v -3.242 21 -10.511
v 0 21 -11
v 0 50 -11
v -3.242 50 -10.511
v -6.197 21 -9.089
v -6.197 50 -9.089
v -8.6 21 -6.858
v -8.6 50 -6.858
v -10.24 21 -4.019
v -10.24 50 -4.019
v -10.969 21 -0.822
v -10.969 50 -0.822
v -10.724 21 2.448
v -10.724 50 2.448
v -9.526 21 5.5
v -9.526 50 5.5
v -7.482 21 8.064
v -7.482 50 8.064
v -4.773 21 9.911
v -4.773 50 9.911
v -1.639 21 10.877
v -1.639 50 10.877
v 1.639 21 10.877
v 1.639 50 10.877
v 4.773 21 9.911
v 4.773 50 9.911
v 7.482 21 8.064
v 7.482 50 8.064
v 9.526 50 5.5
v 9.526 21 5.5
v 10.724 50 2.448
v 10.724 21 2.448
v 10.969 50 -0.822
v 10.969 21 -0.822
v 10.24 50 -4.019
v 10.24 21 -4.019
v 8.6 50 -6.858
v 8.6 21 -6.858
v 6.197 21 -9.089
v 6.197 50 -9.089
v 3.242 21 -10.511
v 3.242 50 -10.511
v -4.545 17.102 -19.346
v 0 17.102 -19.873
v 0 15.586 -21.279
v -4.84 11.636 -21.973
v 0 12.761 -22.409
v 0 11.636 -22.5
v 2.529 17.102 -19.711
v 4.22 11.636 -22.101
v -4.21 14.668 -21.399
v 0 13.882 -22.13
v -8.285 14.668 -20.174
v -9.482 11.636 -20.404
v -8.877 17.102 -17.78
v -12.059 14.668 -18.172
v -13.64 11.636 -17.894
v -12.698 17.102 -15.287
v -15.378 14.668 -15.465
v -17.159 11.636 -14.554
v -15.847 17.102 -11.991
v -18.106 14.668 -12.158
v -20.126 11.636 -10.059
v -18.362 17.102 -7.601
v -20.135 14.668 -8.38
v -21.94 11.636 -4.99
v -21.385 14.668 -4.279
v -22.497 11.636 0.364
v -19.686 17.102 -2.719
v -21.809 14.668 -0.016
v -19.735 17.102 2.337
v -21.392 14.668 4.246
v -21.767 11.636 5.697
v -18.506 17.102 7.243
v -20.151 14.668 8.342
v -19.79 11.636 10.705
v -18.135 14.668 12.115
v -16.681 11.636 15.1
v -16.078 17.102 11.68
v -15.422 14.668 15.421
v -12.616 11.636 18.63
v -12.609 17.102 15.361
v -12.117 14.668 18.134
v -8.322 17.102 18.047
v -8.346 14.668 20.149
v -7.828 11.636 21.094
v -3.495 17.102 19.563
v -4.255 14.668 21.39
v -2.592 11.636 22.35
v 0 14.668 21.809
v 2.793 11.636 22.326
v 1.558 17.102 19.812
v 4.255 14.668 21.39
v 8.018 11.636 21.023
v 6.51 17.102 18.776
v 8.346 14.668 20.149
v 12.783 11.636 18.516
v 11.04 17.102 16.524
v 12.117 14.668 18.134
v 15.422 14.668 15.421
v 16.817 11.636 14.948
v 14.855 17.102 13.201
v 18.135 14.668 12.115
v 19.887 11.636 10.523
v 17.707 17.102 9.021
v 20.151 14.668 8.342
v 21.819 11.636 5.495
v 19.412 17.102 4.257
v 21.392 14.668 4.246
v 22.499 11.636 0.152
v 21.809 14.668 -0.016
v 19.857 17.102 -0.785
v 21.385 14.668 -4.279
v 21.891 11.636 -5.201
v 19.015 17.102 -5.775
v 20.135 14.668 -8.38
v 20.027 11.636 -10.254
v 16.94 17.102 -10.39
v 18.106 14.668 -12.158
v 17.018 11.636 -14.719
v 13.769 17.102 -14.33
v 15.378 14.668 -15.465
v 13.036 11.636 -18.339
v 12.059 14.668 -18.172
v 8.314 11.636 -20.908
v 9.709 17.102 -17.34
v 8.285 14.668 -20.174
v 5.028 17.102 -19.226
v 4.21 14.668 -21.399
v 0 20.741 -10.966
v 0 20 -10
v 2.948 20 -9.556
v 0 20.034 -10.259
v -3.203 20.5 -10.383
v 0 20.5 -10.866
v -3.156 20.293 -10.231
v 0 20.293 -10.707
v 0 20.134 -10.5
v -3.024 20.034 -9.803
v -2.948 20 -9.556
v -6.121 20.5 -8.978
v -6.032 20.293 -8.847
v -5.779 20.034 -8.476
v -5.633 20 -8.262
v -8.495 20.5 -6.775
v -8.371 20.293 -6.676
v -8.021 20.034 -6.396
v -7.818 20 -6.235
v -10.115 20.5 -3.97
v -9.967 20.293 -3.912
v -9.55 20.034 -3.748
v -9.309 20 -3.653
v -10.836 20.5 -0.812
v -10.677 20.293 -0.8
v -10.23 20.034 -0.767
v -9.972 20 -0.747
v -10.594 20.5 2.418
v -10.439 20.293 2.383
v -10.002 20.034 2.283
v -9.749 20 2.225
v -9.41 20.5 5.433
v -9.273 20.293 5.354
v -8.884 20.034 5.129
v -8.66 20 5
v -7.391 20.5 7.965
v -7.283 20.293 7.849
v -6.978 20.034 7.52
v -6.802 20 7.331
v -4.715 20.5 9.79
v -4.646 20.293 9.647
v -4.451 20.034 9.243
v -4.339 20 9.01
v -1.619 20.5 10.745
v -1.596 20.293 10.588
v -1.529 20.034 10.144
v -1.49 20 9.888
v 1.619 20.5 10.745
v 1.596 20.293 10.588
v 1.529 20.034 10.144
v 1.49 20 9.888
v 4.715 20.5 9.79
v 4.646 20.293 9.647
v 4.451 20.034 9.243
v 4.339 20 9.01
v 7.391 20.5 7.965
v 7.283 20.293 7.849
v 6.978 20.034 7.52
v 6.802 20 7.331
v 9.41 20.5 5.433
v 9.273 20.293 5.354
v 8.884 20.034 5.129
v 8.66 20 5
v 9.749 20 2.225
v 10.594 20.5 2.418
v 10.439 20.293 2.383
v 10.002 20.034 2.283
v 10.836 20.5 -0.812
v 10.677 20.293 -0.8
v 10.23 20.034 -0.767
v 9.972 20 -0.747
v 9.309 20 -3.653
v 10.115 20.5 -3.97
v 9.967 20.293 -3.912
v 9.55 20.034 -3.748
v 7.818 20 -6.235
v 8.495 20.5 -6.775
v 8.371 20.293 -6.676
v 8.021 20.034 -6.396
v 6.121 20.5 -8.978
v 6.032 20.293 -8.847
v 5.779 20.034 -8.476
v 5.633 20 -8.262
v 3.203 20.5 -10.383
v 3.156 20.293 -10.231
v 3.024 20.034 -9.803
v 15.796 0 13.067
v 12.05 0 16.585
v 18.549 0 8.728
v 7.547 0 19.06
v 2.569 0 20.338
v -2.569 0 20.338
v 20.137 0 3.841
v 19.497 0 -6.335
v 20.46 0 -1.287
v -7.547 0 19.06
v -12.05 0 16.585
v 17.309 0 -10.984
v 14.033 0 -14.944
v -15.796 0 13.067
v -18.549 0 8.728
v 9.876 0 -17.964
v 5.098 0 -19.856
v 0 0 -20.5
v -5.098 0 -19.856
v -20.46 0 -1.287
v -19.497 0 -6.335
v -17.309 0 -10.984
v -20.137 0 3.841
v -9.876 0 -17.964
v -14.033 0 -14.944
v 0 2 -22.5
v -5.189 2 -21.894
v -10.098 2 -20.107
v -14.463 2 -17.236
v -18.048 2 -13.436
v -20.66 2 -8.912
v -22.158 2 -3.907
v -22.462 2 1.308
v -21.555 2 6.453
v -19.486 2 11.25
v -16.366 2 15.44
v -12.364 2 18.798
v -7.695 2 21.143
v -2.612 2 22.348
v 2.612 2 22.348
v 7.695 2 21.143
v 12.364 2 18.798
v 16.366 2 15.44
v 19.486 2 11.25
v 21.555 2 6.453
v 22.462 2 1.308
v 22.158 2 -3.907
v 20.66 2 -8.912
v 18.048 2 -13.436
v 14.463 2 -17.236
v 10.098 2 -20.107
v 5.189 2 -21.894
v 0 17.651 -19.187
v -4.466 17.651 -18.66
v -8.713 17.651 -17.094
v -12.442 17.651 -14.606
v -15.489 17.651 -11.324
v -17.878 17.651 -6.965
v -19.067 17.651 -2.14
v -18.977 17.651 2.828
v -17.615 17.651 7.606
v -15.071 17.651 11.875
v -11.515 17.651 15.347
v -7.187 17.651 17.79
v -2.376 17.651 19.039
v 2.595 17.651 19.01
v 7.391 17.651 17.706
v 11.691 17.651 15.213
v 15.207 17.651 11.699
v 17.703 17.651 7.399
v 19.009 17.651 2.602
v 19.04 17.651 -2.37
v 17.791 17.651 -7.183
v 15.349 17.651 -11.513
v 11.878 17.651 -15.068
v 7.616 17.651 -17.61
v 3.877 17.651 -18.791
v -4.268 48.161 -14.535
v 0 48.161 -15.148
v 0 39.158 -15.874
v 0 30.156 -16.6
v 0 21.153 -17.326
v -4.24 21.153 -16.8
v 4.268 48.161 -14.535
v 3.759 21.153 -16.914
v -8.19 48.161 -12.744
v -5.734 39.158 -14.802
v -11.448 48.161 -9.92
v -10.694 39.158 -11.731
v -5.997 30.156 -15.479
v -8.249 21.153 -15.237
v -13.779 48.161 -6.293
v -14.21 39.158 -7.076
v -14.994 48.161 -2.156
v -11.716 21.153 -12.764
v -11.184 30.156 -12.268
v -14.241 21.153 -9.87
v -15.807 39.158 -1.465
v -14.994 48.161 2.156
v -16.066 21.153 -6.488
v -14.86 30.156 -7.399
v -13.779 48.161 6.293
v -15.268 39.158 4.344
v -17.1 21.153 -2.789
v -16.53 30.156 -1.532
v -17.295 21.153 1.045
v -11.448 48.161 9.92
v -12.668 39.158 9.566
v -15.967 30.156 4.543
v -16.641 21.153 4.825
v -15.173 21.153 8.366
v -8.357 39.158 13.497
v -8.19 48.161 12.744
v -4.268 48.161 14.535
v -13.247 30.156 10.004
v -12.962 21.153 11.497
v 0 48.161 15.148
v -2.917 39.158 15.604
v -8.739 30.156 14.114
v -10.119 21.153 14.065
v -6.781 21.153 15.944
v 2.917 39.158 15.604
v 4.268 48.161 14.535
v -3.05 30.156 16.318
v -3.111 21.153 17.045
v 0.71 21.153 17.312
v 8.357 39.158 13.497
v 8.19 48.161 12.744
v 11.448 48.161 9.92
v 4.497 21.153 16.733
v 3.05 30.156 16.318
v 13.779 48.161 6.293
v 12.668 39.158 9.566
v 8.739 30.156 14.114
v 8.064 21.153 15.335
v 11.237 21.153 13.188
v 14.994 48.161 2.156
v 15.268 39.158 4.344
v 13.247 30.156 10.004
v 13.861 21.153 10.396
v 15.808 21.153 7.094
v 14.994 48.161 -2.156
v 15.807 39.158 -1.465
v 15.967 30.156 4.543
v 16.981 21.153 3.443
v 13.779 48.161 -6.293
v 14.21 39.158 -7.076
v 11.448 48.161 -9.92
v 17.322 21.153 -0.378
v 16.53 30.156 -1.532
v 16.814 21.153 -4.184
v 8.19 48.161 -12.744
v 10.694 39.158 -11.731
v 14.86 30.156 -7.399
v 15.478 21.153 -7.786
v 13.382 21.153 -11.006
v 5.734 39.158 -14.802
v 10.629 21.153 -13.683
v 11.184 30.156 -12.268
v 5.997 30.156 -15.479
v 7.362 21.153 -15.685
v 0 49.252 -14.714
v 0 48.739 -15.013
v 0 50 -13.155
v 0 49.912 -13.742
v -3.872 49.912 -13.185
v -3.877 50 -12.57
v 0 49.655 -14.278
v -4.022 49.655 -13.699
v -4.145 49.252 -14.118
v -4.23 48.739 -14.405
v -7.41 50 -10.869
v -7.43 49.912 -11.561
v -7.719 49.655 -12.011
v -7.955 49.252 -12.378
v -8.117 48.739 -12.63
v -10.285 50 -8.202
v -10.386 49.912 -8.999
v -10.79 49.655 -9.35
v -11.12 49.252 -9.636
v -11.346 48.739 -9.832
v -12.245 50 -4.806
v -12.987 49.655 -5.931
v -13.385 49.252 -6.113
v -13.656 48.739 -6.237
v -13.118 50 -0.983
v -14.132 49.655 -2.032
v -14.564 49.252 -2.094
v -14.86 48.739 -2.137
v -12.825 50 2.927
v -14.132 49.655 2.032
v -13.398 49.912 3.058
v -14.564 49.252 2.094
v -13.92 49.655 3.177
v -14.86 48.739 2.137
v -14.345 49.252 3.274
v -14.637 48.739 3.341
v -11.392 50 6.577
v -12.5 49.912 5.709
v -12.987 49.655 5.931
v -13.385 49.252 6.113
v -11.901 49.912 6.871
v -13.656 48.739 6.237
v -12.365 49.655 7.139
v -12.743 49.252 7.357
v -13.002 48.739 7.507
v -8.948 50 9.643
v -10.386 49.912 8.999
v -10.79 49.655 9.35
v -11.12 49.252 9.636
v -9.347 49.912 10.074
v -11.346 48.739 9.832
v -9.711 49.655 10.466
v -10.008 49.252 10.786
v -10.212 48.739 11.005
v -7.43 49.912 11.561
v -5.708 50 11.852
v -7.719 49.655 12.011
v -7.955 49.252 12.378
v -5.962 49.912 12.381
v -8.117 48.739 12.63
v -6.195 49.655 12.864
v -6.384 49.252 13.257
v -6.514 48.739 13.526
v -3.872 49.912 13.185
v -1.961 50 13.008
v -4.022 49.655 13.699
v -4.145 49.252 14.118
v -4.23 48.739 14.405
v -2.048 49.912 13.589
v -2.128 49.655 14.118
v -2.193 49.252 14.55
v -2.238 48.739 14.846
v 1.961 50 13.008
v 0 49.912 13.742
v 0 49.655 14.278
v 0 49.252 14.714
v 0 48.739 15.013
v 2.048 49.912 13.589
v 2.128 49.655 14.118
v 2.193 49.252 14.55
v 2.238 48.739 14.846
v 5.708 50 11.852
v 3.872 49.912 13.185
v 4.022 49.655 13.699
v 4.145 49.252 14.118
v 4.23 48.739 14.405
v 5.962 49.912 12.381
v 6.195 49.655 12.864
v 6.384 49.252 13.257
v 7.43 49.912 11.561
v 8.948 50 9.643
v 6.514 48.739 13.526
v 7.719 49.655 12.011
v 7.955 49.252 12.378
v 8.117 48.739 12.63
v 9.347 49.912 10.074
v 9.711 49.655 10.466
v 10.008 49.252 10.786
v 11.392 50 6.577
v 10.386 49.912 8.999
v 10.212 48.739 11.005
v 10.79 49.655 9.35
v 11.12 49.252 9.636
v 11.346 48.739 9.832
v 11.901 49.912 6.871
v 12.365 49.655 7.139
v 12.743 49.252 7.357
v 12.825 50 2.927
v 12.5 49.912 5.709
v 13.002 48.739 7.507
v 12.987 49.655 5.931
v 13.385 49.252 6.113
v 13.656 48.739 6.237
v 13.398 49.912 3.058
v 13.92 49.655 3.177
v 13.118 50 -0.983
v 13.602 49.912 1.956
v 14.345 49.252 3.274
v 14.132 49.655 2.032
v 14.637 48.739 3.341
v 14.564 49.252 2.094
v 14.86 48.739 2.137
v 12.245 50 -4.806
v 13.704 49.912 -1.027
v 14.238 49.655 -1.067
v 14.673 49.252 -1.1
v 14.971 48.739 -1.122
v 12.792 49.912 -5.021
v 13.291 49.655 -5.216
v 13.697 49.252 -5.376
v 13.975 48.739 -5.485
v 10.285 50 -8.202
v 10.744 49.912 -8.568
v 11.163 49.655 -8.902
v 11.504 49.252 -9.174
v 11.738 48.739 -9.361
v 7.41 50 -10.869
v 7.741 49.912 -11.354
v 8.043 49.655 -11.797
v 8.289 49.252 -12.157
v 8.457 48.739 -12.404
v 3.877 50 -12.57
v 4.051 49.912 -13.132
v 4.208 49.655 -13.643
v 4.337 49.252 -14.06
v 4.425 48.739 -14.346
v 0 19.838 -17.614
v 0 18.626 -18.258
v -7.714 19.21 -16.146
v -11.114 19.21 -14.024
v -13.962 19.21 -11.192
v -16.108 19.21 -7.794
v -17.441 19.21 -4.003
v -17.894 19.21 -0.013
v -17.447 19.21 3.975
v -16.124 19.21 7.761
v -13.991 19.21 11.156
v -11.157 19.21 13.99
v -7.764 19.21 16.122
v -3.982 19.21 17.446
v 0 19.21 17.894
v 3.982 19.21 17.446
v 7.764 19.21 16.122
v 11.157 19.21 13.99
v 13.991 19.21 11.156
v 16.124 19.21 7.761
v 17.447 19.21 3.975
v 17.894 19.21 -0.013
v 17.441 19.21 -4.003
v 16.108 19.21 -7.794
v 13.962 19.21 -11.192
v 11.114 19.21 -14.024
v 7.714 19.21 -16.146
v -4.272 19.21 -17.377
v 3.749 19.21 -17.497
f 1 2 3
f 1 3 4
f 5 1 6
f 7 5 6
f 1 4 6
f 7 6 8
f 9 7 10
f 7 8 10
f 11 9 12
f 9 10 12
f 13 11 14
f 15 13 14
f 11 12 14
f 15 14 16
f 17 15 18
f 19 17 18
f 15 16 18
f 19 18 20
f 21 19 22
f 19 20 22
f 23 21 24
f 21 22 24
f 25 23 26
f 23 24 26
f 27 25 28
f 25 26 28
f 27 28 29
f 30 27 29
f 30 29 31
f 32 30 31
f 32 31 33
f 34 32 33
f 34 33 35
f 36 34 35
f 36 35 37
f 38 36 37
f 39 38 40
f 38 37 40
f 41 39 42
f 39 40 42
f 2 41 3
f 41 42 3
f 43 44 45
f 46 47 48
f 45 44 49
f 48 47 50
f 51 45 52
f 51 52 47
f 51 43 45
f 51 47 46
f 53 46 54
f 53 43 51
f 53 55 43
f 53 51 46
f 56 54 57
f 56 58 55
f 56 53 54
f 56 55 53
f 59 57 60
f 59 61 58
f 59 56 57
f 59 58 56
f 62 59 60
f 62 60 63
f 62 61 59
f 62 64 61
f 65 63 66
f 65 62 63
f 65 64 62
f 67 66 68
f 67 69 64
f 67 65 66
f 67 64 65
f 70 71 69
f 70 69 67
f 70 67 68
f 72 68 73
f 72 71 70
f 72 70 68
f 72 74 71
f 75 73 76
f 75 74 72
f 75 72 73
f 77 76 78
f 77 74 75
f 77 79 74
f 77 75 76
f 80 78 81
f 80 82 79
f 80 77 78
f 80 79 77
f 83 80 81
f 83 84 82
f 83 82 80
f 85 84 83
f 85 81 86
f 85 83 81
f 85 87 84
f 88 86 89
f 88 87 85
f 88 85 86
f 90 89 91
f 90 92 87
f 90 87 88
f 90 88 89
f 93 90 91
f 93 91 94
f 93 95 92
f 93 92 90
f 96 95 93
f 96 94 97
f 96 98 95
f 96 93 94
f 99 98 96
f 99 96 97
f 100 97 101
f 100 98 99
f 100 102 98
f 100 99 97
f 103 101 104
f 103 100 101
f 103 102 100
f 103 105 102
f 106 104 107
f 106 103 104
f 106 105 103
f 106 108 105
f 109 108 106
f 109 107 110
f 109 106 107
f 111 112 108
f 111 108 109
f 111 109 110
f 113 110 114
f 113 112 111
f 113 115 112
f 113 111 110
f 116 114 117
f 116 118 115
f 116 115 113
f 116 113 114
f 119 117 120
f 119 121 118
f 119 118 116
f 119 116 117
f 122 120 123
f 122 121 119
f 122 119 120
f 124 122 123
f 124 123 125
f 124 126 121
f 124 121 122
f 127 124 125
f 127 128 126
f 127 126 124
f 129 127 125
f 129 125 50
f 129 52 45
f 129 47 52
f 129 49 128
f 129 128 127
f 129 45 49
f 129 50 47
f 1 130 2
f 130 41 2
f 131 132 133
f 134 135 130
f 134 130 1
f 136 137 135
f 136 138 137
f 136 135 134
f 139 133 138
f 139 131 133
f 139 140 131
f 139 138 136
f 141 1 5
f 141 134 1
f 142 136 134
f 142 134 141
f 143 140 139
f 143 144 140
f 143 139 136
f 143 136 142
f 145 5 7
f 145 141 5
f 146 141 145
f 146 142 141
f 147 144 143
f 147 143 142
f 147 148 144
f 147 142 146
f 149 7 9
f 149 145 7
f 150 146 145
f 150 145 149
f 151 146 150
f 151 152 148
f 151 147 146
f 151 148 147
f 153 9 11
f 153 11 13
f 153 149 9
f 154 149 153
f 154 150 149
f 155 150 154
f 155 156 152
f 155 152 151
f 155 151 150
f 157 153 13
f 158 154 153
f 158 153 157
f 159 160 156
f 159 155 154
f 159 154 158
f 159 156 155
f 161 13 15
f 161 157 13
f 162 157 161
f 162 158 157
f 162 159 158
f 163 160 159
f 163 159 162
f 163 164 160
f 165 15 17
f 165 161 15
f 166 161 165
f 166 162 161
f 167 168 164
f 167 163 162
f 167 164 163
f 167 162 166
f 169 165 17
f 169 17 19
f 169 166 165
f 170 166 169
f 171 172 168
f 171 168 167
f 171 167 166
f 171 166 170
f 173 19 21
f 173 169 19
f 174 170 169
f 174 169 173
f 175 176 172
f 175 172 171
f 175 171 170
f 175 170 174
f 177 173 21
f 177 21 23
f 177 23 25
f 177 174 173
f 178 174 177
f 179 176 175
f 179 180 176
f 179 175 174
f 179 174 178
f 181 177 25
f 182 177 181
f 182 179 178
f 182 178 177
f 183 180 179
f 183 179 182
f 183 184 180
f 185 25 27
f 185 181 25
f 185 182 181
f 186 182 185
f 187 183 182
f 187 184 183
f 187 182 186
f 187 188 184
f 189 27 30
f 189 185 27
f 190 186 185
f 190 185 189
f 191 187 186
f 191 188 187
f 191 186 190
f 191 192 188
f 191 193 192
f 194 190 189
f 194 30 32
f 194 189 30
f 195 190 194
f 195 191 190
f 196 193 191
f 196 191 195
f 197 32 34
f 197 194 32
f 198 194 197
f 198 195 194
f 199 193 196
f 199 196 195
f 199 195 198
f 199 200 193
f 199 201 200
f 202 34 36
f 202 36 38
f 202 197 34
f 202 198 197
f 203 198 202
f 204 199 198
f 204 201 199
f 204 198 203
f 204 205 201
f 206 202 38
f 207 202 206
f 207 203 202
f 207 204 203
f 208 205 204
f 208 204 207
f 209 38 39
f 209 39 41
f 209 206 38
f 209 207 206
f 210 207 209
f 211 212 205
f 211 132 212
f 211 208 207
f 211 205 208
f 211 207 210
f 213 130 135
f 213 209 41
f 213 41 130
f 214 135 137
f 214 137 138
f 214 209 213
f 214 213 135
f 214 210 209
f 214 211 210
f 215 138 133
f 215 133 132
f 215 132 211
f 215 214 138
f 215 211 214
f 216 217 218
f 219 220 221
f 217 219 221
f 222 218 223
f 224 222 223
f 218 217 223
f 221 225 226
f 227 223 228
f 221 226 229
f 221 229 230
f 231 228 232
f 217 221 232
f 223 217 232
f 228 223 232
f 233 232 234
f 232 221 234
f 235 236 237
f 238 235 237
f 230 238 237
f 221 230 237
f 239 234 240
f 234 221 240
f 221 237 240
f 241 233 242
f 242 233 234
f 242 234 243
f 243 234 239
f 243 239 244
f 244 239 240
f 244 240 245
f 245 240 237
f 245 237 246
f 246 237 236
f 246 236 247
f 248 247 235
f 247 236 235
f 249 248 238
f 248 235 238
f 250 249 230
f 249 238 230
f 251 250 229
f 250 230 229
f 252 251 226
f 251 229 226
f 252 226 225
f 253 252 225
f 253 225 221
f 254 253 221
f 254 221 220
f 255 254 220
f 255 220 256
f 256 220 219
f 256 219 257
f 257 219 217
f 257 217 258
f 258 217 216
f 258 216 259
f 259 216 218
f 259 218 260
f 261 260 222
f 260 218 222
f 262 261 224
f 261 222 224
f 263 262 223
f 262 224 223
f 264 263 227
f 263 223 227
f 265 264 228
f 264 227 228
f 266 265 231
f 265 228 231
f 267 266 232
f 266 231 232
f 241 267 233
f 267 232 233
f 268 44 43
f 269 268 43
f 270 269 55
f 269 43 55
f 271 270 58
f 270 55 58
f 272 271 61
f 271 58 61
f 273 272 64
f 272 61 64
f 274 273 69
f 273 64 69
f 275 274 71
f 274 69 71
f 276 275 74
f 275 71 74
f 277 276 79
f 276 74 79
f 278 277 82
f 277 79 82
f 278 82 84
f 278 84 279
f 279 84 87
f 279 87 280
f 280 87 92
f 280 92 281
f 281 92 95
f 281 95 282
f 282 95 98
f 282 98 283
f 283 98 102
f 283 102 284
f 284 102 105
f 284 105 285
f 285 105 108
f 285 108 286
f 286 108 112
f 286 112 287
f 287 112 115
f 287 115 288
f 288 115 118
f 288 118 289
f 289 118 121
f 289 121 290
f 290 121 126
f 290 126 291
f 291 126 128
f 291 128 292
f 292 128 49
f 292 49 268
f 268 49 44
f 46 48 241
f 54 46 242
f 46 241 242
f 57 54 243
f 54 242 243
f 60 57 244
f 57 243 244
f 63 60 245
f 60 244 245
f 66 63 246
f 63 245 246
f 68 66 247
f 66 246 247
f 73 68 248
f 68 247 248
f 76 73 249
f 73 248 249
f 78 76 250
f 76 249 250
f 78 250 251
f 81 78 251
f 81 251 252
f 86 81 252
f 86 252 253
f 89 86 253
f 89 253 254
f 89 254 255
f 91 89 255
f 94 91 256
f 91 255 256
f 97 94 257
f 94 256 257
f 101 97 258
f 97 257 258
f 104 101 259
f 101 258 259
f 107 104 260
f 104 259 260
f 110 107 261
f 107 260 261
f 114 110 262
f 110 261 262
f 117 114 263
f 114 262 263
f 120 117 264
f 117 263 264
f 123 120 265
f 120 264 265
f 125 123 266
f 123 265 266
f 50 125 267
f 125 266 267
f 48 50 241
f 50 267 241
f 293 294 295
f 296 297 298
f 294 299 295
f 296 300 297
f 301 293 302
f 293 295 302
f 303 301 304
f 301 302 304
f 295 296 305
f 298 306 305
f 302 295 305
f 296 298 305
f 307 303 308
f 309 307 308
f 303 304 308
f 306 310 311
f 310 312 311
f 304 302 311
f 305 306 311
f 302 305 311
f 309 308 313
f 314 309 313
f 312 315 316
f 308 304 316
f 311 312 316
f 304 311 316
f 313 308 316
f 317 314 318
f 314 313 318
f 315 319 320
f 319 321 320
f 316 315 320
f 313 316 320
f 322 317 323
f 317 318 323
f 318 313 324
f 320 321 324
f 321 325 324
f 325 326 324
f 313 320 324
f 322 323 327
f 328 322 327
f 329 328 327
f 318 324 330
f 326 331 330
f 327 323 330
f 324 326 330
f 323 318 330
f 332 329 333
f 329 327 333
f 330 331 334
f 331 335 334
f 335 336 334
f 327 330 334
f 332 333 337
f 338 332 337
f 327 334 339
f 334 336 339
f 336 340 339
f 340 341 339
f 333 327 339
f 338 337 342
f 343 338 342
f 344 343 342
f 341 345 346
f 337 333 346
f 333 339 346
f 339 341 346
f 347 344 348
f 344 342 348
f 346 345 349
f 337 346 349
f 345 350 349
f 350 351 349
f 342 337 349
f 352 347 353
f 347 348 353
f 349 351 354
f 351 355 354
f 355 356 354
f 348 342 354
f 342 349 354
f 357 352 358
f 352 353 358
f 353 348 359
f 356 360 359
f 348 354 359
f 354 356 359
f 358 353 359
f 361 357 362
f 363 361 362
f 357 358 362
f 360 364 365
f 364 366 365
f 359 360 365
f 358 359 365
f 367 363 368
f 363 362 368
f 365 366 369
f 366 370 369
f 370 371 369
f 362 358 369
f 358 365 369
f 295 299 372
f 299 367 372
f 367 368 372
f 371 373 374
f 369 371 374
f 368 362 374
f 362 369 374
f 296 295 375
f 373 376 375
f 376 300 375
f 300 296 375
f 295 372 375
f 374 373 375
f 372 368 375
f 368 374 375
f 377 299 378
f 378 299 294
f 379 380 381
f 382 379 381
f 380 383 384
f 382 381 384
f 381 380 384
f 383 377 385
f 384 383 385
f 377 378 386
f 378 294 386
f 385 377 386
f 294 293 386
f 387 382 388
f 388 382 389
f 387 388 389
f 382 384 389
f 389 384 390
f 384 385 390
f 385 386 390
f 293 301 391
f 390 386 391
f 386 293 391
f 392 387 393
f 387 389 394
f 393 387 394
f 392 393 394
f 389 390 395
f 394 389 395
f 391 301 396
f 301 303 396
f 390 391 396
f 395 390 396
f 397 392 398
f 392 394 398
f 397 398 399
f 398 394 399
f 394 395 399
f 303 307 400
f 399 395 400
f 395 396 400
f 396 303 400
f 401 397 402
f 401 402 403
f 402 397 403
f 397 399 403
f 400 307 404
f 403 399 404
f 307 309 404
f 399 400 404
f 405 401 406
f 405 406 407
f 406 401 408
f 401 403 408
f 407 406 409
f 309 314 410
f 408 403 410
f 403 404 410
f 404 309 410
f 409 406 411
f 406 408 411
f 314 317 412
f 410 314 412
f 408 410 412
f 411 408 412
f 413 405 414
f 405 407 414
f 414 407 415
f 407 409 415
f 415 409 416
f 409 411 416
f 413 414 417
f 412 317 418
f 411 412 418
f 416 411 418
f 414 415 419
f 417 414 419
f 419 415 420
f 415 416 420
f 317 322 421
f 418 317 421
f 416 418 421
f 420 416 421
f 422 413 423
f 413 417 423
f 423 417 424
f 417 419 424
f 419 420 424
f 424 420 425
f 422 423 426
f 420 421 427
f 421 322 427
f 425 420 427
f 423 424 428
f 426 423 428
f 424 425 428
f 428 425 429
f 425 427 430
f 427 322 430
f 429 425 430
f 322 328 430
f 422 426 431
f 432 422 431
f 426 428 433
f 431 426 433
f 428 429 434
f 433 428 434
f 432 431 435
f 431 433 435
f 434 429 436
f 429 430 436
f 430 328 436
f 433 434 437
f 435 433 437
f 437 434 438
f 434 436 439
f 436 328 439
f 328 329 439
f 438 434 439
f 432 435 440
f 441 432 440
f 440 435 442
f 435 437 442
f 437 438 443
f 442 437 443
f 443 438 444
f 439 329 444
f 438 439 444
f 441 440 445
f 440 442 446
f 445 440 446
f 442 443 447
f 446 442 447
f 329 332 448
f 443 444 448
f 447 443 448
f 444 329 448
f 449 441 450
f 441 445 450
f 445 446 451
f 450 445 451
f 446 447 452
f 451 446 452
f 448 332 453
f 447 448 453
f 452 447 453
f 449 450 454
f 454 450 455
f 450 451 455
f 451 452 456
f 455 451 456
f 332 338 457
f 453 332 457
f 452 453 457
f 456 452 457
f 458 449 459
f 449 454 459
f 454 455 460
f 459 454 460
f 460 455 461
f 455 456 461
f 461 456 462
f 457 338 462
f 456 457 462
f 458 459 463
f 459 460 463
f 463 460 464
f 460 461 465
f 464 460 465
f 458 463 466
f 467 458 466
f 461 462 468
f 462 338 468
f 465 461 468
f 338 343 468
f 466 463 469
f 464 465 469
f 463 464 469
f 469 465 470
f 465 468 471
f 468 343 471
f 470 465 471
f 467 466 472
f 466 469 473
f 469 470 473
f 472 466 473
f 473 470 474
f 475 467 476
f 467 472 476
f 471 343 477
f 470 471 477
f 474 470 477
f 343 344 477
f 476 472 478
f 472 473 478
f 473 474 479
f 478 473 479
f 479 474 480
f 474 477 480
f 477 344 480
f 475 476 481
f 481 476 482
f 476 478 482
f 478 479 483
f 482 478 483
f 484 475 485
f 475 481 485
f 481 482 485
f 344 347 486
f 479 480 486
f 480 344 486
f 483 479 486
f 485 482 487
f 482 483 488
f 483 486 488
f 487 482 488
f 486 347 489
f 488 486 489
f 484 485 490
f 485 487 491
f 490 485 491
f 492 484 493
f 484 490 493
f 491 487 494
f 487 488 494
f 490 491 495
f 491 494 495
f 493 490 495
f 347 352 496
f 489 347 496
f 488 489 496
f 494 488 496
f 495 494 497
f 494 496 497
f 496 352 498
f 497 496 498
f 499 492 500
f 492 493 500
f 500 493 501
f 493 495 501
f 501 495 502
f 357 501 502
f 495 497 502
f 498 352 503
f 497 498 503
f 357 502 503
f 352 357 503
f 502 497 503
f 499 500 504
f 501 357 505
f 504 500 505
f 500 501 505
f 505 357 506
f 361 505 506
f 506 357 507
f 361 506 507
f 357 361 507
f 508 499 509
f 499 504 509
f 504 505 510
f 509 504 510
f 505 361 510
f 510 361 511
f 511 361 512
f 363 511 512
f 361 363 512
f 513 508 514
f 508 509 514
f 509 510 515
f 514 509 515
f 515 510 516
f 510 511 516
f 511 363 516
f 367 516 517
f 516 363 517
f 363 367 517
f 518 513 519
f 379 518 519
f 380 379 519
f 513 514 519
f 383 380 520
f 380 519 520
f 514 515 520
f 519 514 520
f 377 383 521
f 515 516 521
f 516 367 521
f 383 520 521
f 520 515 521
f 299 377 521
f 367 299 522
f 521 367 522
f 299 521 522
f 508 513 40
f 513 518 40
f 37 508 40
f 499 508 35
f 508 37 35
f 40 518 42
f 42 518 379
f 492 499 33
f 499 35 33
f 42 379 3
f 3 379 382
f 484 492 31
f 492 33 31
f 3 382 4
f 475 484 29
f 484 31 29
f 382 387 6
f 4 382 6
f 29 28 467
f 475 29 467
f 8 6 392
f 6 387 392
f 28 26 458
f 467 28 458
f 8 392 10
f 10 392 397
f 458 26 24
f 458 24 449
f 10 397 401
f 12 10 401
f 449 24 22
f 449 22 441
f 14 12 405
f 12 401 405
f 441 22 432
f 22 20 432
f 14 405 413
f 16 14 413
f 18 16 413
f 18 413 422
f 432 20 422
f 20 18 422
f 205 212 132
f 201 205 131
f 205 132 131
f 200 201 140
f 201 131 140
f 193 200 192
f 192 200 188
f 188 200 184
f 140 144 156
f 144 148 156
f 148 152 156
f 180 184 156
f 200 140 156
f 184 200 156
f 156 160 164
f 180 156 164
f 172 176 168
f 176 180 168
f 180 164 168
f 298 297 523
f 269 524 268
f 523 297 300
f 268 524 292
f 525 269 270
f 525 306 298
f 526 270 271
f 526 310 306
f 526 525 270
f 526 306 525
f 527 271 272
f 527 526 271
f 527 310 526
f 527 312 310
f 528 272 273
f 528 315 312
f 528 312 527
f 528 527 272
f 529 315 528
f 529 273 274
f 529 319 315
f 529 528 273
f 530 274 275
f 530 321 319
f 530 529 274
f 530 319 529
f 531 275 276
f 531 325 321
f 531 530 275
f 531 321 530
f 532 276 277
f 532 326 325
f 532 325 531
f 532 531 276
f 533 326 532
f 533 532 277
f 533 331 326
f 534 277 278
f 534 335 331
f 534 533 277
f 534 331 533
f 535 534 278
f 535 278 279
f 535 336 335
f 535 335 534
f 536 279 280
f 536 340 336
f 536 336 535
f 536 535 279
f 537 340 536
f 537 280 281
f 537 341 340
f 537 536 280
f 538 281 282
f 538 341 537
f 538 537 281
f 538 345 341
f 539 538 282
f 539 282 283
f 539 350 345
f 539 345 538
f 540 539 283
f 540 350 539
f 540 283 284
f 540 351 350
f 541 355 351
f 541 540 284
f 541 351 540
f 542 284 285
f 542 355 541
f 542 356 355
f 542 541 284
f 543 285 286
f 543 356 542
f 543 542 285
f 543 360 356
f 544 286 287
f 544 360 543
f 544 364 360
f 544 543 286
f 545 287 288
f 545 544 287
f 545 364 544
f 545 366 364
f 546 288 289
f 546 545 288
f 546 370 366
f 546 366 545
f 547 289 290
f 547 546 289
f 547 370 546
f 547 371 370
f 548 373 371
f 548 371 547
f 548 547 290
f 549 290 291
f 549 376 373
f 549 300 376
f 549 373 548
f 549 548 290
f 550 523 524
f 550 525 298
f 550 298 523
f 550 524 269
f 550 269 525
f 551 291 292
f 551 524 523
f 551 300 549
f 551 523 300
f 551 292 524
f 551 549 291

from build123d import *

# Parameters (mm, degrees)
FILLET_1_R     = 2
FILLET_2_R     = 5
FILLET_3_R     = 7
CHAMFER_1_SIZE = 2
FILLET_4_R     = 1


with BuildPart() as part:
    # Эскиз1 → Повернуть1 (revolve)
    with BuildSketch(Plane.XY, mode=Mode.PRIVATE) as revolve_1_sk:
        Polygon((0, 20), (-11, 20), (-11, 50), (-15, 50), (-17.5, 19), (-22.5, 15), (-22.5, 0), (0, 0), align=None)
    revolve(revolve_1_sk.sketch.rotate(Axis((0, 0, 0), (0, 1, 0)), 270), axis=Axis((0, 0, 0), (0, 1, 0)))

    # Скругление1
    fillet_1_edges = [part.edges().sort_by_distance(p)[0] for p in [
        (0, 50, 15),
    ]]
    fillet(fillet_1_edges, radius=FILLET_1_R)

    # Скругление2
    fillet_2_edges = [part.edges().sort_by_distance(p)[0] for p in [
        (0, 19, 17.5),
    ]]
    fillet(fillet_2_edges, radius=FILLET_2_R)

    # Скругление3
    fillet_3_edges = [part.edges().sort_by_distance(p)[0] for p in [
        (0, 15, 22.5),
    ]]
    fillet(fillet_3_edges, radius=FILLET_3_R)

    # Фаска1
    chamfer_1_edges = [part.edges().sort_by_distance(p)[0] for p in [
        (0, 0, 22.5),
    ]]
    chamfer(chamfer_1_edges, length=CHAMFER_1_SIZE)

    # Скругление4
    fillet_4_edges = [part.edges().sort_by_distance(p)[0] for p in [
        (0, 20, 11),
    ]]
    fillet(fillet_4_edges, radius=FILLET_4_R)


solid = part.part
